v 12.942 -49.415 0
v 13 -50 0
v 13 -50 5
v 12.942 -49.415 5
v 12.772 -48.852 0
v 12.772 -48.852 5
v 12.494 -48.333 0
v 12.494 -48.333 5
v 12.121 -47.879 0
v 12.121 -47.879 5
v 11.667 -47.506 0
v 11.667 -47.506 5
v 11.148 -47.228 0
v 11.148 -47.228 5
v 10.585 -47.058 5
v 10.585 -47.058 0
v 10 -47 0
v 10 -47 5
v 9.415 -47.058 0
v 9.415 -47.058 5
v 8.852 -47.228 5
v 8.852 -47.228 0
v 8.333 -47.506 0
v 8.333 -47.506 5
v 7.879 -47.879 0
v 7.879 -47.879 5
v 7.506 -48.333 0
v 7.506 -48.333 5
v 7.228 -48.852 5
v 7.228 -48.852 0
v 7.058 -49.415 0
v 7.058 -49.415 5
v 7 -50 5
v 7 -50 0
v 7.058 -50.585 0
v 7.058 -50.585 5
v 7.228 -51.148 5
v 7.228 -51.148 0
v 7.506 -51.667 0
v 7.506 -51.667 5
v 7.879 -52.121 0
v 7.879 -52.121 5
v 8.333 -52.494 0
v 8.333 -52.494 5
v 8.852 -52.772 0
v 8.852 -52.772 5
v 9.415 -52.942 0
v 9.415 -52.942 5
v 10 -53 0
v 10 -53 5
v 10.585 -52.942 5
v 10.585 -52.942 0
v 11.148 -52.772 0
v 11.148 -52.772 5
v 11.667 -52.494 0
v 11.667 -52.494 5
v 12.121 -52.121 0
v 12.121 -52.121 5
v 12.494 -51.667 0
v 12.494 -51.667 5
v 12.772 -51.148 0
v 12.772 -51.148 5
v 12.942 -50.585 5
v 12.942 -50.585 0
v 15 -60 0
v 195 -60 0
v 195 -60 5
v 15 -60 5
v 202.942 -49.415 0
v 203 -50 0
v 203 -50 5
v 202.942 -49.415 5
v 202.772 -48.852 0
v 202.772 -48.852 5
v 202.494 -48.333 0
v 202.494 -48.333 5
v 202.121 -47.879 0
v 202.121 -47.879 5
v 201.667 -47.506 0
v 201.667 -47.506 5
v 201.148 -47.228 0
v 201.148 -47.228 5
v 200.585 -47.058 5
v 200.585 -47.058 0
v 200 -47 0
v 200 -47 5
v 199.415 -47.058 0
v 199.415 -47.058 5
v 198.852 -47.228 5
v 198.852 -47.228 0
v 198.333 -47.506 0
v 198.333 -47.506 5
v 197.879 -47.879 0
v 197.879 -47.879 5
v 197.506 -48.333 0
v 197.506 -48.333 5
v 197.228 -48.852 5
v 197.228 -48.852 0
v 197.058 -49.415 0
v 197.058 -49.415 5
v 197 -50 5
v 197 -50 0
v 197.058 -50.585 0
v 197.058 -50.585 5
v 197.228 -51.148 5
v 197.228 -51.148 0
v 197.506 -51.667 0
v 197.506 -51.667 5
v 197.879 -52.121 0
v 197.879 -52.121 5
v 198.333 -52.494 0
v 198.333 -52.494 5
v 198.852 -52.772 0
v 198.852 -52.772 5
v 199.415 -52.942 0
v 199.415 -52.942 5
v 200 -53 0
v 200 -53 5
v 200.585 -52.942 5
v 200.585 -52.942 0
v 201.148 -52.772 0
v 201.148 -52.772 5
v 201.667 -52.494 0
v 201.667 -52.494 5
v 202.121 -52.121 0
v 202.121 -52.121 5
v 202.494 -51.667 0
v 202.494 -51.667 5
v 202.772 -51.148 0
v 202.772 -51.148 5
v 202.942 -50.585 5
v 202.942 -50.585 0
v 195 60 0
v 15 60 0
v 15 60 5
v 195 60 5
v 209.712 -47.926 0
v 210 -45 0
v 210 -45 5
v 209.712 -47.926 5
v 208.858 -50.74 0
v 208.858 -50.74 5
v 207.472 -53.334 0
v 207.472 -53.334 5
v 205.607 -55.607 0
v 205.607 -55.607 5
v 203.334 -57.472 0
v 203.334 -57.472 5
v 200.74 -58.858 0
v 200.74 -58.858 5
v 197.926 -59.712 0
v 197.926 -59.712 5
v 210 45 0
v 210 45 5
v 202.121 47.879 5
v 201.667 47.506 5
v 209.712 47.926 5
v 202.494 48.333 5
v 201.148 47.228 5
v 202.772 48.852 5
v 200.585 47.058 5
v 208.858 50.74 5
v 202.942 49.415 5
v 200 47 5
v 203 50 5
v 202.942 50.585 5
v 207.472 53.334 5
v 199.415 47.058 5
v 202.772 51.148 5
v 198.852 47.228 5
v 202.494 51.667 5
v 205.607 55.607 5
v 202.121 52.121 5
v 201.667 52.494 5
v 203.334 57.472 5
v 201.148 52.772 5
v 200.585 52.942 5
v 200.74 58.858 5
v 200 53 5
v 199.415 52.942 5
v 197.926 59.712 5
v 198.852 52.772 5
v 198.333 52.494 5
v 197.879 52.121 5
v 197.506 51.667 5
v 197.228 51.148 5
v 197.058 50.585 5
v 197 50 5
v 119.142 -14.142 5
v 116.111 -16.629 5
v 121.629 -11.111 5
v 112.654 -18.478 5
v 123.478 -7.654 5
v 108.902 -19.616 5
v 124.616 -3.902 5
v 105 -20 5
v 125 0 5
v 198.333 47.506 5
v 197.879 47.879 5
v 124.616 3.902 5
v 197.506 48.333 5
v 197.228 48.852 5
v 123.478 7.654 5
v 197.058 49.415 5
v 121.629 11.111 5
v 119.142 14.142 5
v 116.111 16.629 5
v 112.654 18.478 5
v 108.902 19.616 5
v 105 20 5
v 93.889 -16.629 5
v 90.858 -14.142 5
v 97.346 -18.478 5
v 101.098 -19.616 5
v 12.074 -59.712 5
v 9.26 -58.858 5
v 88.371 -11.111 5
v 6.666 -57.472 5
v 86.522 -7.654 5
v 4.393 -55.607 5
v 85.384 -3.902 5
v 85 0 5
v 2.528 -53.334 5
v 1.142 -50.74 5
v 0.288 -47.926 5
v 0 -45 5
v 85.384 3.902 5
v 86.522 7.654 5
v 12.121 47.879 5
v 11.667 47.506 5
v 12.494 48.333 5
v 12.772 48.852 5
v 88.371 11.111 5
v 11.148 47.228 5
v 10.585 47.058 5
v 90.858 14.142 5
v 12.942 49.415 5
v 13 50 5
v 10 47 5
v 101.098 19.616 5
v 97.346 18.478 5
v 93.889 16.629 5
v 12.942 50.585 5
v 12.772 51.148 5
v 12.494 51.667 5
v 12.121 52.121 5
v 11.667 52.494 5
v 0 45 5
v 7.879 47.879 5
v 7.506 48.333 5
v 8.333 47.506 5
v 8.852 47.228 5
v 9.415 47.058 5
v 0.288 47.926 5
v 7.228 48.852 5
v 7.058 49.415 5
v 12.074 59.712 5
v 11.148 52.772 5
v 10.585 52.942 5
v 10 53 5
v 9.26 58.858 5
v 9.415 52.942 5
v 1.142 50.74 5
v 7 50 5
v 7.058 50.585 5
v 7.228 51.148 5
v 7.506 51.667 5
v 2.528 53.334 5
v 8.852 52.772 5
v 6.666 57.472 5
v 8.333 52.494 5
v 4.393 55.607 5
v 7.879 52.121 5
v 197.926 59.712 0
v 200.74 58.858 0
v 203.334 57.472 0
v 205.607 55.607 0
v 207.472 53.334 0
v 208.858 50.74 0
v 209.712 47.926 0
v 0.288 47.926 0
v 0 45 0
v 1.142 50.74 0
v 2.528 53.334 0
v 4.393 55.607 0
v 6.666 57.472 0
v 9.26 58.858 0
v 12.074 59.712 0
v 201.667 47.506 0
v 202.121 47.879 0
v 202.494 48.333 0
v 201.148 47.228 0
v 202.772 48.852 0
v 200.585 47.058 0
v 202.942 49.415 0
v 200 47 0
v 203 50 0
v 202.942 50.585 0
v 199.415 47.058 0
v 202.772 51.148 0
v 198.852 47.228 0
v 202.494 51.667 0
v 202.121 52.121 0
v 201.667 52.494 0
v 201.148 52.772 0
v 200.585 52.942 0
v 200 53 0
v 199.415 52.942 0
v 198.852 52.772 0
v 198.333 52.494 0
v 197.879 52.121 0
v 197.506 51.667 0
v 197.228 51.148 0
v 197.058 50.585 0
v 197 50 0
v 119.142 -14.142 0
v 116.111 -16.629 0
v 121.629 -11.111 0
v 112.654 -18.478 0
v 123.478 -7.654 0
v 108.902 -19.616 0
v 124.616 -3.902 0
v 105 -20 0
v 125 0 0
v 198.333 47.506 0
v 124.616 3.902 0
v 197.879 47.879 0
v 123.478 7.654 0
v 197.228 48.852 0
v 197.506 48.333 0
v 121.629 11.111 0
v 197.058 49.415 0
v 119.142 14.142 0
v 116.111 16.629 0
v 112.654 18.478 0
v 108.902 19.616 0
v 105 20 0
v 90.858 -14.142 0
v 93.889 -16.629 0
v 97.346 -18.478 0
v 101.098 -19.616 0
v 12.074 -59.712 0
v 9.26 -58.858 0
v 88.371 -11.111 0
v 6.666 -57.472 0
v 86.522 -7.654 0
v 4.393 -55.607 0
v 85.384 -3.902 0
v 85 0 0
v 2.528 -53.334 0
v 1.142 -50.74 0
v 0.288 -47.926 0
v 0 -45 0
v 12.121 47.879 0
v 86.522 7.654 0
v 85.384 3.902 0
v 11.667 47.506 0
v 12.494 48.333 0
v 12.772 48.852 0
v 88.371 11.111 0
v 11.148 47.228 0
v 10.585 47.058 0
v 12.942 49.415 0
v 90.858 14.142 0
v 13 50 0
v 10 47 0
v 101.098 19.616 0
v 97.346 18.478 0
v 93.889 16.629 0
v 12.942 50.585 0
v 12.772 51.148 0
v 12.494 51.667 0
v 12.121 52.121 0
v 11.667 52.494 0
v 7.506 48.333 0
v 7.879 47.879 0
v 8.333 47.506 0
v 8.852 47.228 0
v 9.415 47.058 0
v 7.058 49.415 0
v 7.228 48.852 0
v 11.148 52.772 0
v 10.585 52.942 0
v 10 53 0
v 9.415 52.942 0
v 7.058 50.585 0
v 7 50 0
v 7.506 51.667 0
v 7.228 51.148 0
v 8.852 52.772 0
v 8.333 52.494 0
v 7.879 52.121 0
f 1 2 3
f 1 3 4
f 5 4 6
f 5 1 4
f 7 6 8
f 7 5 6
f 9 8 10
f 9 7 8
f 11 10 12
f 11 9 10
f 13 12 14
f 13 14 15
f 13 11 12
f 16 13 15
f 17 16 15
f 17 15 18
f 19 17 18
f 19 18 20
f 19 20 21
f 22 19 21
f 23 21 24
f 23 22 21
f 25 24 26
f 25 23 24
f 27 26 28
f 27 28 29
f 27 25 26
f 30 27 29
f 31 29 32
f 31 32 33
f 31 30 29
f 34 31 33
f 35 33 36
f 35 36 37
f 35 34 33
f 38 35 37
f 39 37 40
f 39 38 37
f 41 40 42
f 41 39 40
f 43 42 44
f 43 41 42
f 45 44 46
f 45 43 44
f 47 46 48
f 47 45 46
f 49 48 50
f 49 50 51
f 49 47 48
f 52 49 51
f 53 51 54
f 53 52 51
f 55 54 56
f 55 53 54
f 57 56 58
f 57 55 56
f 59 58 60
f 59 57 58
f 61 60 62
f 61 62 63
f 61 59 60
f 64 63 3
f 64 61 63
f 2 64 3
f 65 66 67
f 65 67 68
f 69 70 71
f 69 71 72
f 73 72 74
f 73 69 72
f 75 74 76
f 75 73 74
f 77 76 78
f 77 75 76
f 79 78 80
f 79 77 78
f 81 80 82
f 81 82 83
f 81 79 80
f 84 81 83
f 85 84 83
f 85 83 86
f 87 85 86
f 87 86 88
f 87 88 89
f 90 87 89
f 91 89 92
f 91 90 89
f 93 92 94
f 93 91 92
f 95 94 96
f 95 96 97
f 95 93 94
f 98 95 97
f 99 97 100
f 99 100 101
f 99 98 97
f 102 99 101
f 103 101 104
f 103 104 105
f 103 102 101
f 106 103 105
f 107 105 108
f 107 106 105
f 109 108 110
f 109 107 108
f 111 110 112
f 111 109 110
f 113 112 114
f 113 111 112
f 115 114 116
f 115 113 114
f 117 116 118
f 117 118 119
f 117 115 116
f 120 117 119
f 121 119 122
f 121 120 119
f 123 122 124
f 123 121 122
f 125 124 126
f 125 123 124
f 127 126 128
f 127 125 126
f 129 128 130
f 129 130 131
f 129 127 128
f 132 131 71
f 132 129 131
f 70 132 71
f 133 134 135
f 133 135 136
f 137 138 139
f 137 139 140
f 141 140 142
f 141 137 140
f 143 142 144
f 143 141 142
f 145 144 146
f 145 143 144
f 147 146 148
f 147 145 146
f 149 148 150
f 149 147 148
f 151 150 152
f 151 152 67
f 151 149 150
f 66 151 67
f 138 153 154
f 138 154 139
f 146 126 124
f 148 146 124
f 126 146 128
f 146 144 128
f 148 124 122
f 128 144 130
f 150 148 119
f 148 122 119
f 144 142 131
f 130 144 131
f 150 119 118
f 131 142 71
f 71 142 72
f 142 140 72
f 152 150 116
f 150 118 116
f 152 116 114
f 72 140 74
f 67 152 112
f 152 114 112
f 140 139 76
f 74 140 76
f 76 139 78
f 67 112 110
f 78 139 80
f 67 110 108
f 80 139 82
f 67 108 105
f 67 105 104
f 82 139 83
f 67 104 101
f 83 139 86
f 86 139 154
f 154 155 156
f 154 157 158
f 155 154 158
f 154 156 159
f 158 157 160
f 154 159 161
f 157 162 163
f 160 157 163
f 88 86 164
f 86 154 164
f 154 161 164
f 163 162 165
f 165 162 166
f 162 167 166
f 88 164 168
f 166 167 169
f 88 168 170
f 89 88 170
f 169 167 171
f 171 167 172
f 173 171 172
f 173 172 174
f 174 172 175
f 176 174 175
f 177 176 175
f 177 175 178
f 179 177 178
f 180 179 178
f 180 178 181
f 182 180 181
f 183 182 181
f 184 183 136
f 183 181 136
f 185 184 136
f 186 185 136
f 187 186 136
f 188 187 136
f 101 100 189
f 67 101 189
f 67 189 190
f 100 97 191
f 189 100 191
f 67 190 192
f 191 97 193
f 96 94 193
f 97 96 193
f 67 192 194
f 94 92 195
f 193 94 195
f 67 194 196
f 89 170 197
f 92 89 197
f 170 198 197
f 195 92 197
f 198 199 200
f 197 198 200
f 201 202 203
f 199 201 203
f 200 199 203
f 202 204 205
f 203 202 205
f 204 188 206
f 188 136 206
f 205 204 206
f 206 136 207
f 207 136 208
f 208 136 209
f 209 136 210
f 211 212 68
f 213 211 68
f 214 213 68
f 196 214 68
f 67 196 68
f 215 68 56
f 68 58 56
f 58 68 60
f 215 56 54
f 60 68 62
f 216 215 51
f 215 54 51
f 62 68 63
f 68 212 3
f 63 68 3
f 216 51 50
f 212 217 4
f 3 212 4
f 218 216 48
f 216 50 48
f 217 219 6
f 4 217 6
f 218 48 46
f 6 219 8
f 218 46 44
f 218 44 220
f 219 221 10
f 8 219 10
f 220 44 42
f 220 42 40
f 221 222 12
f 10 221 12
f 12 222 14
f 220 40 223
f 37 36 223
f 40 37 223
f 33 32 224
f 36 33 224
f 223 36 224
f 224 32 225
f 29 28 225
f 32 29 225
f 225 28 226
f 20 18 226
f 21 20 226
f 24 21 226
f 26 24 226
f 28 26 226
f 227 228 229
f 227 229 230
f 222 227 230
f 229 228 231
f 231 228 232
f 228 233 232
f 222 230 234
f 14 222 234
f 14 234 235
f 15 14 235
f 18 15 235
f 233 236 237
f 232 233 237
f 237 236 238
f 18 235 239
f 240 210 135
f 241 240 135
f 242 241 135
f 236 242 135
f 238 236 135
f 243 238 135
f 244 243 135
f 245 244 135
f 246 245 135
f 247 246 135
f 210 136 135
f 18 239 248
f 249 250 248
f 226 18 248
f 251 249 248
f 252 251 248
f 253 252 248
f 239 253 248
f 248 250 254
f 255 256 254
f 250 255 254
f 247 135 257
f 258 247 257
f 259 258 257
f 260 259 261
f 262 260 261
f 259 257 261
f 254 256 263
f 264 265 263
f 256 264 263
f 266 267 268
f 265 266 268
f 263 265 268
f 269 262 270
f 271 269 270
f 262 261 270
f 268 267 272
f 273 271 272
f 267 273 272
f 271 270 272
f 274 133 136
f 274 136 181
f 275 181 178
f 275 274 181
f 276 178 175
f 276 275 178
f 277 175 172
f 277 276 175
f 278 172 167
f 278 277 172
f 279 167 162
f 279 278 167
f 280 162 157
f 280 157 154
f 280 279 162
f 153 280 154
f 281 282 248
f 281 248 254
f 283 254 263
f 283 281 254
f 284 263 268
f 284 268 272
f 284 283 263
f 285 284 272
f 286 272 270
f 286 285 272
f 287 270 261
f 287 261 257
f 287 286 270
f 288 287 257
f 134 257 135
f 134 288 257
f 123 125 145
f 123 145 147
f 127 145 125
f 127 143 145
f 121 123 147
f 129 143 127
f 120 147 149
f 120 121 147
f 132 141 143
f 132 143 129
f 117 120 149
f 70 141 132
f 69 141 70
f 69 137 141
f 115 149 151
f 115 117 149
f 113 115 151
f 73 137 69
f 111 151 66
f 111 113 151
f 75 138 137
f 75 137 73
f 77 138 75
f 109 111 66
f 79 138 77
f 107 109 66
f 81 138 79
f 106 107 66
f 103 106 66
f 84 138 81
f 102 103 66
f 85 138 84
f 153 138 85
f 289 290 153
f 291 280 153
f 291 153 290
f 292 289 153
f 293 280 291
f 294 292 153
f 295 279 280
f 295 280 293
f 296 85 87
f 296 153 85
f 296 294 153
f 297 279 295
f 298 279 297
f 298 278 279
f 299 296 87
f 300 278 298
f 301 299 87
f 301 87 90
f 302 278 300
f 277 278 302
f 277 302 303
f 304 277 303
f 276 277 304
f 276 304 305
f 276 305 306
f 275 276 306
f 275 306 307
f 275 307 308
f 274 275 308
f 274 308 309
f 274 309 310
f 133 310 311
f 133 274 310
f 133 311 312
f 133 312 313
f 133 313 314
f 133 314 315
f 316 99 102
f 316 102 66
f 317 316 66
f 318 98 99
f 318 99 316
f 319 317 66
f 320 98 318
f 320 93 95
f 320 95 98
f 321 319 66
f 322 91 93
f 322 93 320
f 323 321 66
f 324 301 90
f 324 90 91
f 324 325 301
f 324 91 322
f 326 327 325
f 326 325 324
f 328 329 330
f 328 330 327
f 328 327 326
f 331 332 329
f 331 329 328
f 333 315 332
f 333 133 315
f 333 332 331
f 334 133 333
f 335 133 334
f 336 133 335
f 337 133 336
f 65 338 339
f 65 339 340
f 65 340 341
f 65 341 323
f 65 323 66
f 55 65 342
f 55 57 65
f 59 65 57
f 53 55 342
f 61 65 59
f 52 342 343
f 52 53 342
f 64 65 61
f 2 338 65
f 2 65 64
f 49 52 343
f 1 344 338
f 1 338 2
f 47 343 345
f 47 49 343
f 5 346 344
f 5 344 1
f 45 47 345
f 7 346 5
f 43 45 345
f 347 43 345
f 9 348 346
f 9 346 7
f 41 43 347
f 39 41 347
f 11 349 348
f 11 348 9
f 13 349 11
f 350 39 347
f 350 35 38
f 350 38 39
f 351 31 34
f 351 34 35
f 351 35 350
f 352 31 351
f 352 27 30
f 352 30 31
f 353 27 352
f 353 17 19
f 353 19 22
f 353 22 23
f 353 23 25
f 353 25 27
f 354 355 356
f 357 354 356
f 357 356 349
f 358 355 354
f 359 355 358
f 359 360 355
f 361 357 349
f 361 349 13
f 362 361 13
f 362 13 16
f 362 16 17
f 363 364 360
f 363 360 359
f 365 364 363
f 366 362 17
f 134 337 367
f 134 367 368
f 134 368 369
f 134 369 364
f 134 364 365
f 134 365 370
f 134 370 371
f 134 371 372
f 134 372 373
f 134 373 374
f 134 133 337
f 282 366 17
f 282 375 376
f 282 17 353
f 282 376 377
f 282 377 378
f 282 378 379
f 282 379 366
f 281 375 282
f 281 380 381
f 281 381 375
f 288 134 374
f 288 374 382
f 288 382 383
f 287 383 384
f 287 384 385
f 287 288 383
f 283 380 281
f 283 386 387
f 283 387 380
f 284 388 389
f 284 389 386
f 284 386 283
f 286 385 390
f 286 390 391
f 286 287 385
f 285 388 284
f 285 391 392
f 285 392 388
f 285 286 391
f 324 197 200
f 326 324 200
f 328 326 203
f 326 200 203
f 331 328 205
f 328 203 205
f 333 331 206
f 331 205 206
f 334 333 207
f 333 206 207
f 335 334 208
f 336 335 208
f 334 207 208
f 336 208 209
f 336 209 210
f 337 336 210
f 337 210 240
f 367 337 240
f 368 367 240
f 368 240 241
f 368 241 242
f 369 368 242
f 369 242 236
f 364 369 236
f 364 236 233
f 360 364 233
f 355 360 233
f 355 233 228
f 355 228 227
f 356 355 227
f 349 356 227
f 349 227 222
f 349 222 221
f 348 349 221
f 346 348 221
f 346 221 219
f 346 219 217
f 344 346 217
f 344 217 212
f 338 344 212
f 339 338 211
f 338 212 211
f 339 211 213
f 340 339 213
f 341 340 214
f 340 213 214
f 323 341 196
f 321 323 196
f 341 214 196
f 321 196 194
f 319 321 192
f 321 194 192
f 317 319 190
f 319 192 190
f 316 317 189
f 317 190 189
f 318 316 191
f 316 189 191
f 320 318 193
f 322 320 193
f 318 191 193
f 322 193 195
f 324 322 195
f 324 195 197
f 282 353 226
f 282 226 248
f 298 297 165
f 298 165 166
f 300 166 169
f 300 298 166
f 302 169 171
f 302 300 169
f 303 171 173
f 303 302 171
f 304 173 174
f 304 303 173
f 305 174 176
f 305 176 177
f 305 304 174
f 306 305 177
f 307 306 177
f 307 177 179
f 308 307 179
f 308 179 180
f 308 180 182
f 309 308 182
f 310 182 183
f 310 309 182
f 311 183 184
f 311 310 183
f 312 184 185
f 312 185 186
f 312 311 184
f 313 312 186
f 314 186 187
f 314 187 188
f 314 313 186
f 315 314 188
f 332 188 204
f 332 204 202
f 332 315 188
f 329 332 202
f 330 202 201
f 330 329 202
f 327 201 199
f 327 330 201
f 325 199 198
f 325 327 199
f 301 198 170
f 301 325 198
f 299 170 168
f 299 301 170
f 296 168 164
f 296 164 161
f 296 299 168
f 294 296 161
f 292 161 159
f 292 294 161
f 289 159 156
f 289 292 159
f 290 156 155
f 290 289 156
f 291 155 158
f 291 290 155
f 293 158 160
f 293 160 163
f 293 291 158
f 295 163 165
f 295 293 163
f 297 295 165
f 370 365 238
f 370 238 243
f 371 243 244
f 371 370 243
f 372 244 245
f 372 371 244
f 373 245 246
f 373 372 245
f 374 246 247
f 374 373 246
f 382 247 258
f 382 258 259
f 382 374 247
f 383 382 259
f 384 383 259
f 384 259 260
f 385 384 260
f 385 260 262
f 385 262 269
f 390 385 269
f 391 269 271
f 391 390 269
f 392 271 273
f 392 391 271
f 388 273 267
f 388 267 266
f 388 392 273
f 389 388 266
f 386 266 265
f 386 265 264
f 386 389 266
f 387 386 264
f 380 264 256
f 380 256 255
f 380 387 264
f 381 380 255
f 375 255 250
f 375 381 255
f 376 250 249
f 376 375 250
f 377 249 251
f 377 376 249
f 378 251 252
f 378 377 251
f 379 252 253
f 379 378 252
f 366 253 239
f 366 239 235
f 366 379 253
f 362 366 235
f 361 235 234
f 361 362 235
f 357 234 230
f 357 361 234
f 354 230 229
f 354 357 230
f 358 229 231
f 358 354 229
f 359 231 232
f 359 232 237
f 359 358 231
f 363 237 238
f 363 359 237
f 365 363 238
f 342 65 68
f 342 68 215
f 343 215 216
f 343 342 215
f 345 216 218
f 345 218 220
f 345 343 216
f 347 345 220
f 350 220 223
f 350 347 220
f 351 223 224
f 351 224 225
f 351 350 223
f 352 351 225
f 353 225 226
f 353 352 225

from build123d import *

# Parameters (mm, degrees)
EXTRUDE_1_DEPTH     = 5
SKETCH_2_R          = 20
CUT_EXTRUDE_1_DEPTH = 219.46052275
OTHER_1_OUTLINE_R   = 3
OTHER_1_DEPTH       = 5


# Read off the part's stored shape, not the designer's step: 孔1
with BuildPart() as part:
    # 草图1 → 凸台-拉伸1 (new body)
    with BuildSketch(Plane.XY):
        with BuildLine():
            Line((15, 60), (195, 60))
            ThreePointArc((195, 60), (205.606601718, 55.606601718), (210, 45))
            Line((210, 45), (210, -45))
            ThreePointArc((210, -45), (205.606601718, -55.606601718), (195, -60))
            Line((195, -60), (15, -60))
            ThreePointArc((15, -60), (4.393398282, -55.606601718), (0, -45))
            Line((0, -45), (0, 45))
            ThreePointArc((0, 45), (4.393398282, 55.606601718), (15, 60))
        make_face()
    extrude(amount=EXTRUDE_1_DEPTH)

    # 草图2 → 切除-拉伸1 (cut, through all)
    with BuildSketch(Plane.XY.offset(5)):
        with Locations((105, 0)):
            Circle(SKETCH_2_R)
    extrude(amount=-CUT_EXTRUDE_1_DEPTH, mode=Mode.SUBTRACT)

    # 孔1 outline → 孔1 (cut)
    with BuildSketch(Plane.XY):
        with Locations((10, 50)):
            Circle(OTHER_1_OUTLINE_R)
        with Locations((10, -50)):
            Circle(OTHER_1_OUTLINE_R)
        with Locations((200, -50)):
            Circle(OTHER_1_OUTLINE_R)
        with Locations((200, 50)):
            Circle(OTHER_1_OUTLINE_R)
    extrude(amount=OTHER_1_DEPTH, mode=Mode.SUBTRACT)


solid = part.part
